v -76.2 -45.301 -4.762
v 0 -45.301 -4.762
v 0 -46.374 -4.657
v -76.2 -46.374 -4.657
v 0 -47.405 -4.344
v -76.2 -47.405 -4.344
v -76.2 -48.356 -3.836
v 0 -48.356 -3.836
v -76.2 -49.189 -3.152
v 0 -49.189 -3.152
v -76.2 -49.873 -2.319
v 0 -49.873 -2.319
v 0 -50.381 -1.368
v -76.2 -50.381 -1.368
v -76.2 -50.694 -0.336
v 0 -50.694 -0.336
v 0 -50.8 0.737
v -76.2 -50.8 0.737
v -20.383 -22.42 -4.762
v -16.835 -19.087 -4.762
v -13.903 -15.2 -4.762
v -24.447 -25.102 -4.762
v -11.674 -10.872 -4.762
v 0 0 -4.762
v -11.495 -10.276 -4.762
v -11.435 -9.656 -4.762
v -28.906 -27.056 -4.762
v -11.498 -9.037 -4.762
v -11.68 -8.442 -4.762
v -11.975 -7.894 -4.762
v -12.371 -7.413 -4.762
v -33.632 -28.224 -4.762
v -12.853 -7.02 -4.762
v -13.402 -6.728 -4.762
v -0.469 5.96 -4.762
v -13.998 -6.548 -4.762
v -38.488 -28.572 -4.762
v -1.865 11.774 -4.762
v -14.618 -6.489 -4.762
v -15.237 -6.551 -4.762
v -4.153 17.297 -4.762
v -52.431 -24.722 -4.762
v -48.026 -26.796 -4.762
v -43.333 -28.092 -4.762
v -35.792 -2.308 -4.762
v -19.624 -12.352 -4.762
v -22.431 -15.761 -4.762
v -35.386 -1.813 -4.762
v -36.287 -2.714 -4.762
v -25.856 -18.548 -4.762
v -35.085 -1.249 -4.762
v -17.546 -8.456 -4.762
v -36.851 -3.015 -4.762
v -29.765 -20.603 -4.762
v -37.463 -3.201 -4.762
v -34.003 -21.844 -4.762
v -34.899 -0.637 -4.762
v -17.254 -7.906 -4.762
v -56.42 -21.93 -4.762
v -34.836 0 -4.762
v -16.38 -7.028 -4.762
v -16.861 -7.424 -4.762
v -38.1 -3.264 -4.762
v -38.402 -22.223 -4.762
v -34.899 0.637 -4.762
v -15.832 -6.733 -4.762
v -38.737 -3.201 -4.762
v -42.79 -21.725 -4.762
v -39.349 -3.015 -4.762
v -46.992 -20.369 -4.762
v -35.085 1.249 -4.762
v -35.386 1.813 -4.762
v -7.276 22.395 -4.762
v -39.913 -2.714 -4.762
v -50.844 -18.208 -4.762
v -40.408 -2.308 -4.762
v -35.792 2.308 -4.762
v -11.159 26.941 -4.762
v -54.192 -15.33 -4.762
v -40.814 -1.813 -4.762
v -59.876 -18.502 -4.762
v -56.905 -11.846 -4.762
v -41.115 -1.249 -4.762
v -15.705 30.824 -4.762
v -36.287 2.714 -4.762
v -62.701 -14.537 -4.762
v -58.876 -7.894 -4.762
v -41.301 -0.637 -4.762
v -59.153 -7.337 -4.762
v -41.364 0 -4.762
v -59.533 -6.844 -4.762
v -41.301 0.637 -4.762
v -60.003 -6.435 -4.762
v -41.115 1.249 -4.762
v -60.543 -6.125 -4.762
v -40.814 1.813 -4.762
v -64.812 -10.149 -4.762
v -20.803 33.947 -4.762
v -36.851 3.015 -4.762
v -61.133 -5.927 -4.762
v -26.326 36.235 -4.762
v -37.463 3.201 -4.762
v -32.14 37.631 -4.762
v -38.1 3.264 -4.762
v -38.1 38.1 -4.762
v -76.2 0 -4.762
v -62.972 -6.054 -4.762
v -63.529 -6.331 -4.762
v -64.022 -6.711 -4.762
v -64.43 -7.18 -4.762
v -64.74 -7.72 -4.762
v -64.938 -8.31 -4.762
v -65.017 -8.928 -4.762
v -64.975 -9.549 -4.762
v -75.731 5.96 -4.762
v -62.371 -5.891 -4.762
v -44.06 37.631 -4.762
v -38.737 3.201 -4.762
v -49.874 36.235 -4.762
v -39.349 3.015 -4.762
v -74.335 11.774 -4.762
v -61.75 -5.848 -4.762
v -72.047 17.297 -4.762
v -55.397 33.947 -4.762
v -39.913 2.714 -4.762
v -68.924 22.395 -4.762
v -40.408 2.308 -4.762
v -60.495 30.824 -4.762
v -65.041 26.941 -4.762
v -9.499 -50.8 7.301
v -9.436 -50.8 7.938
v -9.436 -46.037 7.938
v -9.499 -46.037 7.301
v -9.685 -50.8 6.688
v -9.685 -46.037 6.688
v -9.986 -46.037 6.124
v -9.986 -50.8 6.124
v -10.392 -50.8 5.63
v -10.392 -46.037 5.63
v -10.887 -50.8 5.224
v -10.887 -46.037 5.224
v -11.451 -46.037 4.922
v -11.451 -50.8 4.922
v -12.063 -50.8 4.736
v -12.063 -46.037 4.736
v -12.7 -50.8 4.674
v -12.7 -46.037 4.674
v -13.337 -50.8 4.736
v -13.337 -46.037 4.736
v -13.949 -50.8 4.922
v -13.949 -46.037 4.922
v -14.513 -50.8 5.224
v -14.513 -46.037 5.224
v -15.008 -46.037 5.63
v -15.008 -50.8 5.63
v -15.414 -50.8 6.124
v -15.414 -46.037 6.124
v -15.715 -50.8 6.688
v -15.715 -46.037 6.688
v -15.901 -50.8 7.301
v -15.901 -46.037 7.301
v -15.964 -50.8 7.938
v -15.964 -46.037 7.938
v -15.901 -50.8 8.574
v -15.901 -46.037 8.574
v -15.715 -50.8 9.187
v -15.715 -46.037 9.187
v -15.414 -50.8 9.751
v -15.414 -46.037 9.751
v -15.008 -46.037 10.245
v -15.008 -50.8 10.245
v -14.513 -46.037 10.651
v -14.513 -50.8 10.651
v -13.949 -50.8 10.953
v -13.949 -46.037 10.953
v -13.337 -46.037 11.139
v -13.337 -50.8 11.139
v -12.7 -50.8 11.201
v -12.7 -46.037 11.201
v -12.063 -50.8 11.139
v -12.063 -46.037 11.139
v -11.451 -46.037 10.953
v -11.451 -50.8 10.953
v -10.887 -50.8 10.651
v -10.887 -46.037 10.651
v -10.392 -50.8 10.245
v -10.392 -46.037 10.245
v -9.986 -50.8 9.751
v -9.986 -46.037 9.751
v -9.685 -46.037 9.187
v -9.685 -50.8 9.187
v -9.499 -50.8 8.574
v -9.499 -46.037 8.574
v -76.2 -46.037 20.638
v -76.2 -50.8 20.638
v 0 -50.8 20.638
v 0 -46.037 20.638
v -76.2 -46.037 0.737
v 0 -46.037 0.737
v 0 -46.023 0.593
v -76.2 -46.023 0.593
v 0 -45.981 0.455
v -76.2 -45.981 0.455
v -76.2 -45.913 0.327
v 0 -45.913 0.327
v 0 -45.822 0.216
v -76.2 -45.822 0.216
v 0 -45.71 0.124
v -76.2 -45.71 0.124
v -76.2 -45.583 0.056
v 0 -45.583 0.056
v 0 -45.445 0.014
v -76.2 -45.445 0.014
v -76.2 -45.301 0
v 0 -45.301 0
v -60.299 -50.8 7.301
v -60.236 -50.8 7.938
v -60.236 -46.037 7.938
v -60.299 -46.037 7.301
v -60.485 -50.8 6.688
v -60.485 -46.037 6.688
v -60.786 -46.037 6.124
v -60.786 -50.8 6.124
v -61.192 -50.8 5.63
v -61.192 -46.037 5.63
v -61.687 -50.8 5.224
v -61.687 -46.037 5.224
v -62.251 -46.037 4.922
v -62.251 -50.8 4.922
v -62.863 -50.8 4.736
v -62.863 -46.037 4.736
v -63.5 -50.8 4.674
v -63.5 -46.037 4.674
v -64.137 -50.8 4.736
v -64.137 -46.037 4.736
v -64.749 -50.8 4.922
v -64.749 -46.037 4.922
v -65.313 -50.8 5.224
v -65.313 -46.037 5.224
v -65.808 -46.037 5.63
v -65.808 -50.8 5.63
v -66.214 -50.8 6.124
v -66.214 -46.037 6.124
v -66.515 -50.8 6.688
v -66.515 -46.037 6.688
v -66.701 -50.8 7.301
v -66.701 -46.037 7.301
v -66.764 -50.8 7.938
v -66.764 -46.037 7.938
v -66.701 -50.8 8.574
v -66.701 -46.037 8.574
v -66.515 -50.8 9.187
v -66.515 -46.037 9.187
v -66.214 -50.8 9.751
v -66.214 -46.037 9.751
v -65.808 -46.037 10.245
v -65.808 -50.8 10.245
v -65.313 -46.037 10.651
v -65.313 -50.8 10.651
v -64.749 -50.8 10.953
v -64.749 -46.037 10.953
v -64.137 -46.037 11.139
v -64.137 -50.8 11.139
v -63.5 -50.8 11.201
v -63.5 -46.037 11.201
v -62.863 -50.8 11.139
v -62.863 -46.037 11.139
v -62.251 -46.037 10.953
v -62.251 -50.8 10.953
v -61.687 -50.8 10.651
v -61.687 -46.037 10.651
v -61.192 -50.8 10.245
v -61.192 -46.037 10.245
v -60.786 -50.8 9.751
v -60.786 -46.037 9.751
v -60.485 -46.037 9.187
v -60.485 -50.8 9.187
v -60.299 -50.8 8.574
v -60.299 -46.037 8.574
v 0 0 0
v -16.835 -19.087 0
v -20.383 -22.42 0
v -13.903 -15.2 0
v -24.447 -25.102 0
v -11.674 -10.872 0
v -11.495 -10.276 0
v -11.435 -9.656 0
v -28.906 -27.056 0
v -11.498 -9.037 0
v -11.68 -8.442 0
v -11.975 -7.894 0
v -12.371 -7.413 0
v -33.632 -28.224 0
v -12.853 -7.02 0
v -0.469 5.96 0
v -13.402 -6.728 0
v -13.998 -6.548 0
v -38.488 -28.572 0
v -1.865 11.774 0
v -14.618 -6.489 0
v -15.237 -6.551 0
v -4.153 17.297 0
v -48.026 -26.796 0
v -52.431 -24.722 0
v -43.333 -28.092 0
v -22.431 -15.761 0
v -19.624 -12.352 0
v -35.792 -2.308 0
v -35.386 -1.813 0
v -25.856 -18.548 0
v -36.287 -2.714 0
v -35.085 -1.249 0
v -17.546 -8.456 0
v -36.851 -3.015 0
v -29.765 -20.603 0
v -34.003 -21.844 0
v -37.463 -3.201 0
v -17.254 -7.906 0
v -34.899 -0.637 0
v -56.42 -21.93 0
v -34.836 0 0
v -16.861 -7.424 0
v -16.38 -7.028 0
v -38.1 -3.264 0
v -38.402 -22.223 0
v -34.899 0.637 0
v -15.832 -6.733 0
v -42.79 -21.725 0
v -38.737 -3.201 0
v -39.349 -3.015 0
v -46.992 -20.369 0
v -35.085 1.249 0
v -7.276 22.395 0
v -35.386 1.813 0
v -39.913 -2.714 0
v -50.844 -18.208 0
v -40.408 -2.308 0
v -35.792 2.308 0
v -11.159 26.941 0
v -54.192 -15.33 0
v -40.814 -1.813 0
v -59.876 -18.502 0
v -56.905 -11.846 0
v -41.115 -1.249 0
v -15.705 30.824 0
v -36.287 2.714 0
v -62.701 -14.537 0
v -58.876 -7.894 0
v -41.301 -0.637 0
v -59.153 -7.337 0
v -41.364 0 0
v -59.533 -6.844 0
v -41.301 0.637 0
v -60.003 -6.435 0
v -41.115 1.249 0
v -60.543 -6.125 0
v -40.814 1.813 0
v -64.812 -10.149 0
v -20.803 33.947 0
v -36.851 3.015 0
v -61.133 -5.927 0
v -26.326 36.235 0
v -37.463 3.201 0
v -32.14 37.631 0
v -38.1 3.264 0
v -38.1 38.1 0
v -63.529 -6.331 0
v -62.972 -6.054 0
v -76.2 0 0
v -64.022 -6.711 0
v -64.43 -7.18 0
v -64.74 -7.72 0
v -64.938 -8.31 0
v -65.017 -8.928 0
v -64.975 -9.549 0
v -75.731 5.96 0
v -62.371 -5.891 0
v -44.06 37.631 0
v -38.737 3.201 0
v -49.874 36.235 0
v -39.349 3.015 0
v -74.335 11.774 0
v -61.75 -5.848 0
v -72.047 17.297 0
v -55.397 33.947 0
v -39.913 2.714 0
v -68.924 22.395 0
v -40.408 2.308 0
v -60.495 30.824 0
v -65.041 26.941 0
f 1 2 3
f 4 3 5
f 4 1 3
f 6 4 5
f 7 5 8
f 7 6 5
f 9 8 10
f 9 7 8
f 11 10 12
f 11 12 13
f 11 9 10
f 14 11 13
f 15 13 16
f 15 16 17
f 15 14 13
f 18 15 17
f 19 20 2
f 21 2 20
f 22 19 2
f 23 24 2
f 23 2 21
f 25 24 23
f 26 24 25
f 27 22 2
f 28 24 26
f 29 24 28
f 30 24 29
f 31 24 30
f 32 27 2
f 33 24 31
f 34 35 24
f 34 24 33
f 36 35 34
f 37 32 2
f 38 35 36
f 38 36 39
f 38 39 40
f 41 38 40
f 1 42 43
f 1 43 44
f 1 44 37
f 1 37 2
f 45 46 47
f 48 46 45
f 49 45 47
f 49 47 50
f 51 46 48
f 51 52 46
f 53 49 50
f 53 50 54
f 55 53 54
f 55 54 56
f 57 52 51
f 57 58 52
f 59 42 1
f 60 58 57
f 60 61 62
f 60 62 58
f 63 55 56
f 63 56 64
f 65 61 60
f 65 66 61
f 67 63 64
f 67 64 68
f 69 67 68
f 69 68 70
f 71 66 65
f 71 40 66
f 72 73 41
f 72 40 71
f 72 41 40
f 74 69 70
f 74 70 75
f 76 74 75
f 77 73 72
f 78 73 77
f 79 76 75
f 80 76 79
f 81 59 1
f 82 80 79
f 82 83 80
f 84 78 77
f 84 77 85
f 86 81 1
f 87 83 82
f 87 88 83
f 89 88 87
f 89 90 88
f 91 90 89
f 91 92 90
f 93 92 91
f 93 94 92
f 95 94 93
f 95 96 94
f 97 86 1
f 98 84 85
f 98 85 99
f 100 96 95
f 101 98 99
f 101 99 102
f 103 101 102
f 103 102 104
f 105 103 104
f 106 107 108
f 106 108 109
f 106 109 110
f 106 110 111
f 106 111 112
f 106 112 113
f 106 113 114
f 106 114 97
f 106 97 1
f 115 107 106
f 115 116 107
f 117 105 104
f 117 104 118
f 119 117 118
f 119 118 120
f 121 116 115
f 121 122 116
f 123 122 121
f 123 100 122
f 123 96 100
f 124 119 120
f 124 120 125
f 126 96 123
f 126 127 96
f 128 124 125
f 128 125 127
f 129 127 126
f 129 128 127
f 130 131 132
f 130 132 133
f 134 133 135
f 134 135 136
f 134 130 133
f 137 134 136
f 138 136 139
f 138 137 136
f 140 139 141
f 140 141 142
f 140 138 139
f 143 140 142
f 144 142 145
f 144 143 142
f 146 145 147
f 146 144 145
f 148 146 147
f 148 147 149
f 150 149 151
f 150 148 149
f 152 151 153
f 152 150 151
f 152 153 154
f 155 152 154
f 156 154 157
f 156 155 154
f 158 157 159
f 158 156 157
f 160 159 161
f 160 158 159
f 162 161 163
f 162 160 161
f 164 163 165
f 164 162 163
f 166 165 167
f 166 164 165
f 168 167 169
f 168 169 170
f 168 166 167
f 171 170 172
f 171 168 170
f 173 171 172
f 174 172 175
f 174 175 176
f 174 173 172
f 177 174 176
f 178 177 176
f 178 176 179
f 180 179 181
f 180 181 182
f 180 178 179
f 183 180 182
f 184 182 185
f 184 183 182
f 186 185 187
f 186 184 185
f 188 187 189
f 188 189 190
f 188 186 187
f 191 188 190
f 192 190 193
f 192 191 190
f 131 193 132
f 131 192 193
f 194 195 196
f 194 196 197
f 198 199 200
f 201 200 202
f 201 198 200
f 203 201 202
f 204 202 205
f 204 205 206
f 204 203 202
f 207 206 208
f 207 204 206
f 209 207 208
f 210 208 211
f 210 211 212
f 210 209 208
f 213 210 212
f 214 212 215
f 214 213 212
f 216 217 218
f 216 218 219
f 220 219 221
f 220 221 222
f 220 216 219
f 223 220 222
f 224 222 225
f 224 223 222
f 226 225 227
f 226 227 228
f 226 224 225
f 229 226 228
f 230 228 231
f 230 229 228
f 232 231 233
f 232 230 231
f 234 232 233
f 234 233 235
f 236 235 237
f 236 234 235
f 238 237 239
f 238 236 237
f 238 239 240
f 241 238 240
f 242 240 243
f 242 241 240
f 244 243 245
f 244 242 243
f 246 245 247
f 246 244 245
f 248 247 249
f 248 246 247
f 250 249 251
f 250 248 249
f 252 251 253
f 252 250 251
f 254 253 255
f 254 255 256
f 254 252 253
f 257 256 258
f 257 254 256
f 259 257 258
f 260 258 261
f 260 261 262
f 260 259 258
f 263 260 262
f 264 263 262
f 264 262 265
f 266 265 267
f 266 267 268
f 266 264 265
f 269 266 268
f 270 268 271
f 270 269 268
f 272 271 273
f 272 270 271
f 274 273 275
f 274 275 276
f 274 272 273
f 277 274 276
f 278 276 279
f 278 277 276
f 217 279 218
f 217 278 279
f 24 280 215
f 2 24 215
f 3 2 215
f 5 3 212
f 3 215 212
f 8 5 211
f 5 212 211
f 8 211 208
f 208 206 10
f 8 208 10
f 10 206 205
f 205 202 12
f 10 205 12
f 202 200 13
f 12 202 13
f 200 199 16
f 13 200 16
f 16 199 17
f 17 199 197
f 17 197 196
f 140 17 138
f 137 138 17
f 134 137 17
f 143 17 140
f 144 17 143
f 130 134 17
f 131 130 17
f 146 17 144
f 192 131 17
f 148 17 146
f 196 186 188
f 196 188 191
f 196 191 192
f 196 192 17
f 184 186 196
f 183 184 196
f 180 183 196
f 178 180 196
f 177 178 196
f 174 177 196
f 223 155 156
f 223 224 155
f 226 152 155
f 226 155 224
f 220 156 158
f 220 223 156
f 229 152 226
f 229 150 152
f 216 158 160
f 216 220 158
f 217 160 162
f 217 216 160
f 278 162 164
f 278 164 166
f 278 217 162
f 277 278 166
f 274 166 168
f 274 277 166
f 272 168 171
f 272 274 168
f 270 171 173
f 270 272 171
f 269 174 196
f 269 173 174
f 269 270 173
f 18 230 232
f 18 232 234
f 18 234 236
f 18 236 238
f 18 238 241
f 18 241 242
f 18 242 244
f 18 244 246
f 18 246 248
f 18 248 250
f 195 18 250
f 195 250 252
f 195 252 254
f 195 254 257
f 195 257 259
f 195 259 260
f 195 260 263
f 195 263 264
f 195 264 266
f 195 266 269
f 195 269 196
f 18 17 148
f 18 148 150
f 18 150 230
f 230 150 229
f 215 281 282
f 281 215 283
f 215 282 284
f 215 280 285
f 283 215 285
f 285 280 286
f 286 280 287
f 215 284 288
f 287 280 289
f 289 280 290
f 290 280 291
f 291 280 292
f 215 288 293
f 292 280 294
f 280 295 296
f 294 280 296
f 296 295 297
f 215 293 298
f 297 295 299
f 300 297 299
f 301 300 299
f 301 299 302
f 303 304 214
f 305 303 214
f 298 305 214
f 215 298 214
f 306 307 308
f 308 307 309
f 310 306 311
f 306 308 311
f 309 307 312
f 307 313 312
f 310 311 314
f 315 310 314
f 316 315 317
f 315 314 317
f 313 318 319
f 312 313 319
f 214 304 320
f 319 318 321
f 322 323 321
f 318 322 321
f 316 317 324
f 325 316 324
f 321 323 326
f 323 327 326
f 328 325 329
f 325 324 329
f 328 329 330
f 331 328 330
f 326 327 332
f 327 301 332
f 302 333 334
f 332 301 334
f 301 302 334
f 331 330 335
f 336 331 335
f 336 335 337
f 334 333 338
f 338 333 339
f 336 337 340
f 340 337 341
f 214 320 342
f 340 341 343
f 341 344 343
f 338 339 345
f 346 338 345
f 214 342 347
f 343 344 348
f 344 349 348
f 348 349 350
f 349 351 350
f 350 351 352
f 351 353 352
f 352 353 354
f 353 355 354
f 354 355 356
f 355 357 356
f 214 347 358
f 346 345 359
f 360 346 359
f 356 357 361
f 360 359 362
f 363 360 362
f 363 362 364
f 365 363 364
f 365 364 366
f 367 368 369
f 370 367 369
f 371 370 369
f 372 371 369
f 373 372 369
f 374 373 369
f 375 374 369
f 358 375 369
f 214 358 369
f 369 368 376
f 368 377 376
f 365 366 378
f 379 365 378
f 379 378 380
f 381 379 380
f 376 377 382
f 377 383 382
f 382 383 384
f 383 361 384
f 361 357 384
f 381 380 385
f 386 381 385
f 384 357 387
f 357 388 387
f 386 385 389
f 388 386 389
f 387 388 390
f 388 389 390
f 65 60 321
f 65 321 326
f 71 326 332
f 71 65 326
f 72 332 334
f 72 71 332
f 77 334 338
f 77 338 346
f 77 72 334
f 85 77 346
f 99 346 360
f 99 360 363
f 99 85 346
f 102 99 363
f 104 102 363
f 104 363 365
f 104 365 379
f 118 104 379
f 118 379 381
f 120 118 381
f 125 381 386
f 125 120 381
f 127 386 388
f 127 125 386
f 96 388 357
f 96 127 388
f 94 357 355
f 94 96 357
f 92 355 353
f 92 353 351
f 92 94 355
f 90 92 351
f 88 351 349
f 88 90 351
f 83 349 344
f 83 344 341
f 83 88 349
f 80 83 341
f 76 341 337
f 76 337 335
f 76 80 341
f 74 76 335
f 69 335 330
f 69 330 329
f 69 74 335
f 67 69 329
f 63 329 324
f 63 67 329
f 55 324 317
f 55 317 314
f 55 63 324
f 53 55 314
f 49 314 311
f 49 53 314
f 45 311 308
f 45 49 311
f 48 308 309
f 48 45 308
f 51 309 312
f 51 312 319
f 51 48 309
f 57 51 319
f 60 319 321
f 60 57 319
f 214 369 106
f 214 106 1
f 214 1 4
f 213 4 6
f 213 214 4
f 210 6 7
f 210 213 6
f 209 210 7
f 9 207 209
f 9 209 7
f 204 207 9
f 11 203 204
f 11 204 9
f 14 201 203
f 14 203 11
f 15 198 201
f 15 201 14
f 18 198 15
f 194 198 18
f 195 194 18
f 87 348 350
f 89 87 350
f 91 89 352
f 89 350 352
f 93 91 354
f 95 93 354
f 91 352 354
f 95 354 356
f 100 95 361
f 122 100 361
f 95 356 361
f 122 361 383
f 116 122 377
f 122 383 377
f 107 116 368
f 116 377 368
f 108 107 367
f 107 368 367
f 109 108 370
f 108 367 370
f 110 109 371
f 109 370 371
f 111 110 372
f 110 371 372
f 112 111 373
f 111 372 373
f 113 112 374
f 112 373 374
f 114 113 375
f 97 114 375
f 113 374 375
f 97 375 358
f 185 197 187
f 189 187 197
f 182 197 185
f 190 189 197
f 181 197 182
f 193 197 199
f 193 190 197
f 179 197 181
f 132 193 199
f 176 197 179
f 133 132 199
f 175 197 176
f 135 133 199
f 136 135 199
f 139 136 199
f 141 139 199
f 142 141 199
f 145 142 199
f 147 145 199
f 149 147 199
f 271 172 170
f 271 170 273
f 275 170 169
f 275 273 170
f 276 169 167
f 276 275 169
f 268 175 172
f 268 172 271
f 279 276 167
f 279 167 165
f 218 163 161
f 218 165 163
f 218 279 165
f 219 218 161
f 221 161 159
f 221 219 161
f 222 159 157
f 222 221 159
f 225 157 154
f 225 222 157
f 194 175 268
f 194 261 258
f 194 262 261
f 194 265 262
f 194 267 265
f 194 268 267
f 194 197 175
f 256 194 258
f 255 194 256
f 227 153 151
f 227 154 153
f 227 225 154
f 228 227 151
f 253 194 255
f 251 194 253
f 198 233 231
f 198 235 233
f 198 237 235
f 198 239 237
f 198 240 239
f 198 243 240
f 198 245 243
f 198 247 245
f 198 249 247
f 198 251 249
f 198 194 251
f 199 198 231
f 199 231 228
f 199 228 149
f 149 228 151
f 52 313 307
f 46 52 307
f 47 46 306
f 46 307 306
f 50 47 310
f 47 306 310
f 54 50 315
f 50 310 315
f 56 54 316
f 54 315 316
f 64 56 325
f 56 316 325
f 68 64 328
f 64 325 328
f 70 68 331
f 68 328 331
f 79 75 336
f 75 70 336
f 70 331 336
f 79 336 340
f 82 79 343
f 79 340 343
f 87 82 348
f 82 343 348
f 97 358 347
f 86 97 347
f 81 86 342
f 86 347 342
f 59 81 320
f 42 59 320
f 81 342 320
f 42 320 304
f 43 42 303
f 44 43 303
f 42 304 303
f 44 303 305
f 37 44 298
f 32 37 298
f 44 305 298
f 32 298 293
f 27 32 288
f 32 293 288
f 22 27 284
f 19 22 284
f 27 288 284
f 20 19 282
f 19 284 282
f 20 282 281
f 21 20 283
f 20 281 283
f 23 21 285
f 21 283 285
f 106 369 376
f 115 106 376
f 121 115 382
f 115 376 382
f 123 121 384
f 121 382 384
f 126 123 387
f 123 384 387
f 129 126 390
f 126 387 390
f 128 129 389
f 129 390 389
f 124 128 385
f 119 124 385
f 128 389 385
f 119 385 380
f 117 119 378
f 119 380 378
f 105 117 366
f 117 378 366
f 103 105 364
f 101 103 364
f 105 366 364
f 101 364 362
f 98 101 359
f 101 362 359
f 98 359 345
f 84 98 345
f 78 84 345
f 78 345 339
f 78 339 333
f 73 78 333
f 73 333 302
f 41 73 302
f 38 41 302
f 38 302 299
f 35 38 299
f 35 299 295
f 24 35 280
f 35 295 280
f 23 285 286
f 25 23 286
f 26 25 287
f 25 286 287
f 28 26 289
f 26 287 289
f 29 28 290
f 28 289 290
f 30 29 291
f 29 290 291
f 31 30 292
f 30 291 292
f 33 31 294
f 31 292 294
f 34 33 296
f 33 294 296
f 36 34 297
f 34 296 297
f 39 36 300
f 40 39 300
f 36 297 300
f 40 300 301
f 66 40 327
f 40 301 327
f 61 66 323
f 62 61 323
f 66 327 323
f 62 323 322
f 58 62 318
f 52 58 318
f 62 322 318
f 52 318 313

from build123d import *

# Parameters (mm, degrees)
BASE_FLANGE1_DEPTH                = 4.7625
EDGE_FLANGE2_STRIP_W              = 20.5232
EDGE_FLANGE2_STRIP_H              = 4.7625
EDGE_FLANGE2_STRIP_CUT_DEPTH      = 76.2
EDGE_FLANGE2_DEPTH                = 76.2
F_1_4_START                       = -50.8
F_1_4_CLEARANCE_HOLE3_OUTLINE_R   = 3.2639
F_1_4_CLEARANCE_HOLE3_DEPTH       = 4.7625
F_1_4_START_2                     = -4.7625
F_1_4_CLEARANCE_HOLE3_2_OUTLINE_R = 3.2639
F_1_4_CLEARANCE_HOLE3_2_DEPTH     = 4.7625
CUT_EXTRUDE1_DEPTH                = 94.877507457


# Read off the part's stored shape, not the designer's step: 1/4 Clearance Hole3
# Sheet-metal steps are written as plain solids
with BuildPart() as part:
    # Sketch1 → Base-Flange1 (new body)
    with BuildSketch(Plane.XY):
        with BuildLine():
            Line((0, 0), (0, -50.8))
            Line((0, -50.8), (-76.2, -50.8))
            Line((-76.2, -50.8), (-76.2, 0))
            ThreePointArc((-76.2, 0), (-38.1, 38.1), (0, 0))
        make_face()
    extrude(amount=-BASE_FLANGE1_DEPTH)

    # Edge-Flange2 strip (across the edge) → Edge-Flange2 strip cut (cut)
    with BuildSketch(Plane(origin=(-76.2, -50.8, 0), x_dir=(0, 1, 0), z_dir=(1, 0, 0))):
        with Locations((-4.7625, -2.38125)):
            Rectangle(EDGE_FLANGE2_STRIP_W, EDGE_FLANGE2_STRIP_H)
    extrude(amount=EDGE_FLANGE2_STRIP_CUT_DEPTH, mode=Mode.SUBTRACT)

    # Edge-Flange2 section (across the edge) → Edge-Flange2 (add)
    with BuildSketch(Plane(origin=(-76.2, -50.8, 0), x_dir=(0, 1, 0), z_dir=(1, 0, 0))):
        with BuildLine():
            Line((0, 0.7366), (0, 20.6375))
            Line((0, 20.6375), (4.7625, 20.6375))
            Line((4.7625, 20.6375), (4.7625, 0.7366))
            ThreePointArc((4.7625, 0.7366), (4.978245145, 0.215745145), (5.4991, 0))
            Line((5.4991, 0), (5.4991, -4.7625))
            ThreePointArc((5.4991, -4.7625), (1.6106491, -3.1518509), (0, 0.7366))
        make_face()
    extrude(amount=EDGE_FLANGE2_DEPTH)

    # 1/4 Clearance Hole3 outline → 1/4 Clearance Hole3 (cut)
    with BuildSketch(Plane(origin=(0, 0, 0), x_dir=(1, 0, 0), z_dir=(0, 1, 0)).offset(F_1_4_START)):
        with Locations((-12.7, -7.9375)):
            Circle(F_1_4_CLEARANCE_HOLE3_OUTLINE_R)
        with Locations((-63.5, -7.9375)):
            Circle(F_1_4_CLEARANCE_HOLE3_OUTLINE_R)
    extrude(amount=F_1_4_CLEARANCE_HOLE3_DEPTH, mode=Mode.SUBTRACT)

    # 1_4 Clearance Hole3 2 outline → 1_4 Clearance Hole3 2 (cut)
    with BuildSketch(Plane.XY.offset(F_1_4_START_2)):
        with Locations((-38.1, 0)):
            Circle(F_1_4_CLEARANCE_HOLE3_2_OUTLINE_R)
    extrude(amount=F_1_4_CLEARANCE_HOLE3_2_DEPTH, mode=Mode.SUBTRACT)

    # Sketch25 → Cut-Extrude1 (cut, through all)
    with BuildSketch(Plane.XY):
        with BuildLine():
            ThreePointArc((-64.811855715, -10.149255602), (-38.48848332, -28.57235912), (-11.673955742, -10.871743644))
            ThreePointArc((-11.673955742, -10.871743644), (-13.402211365, -6.727544988), (-17.546410021, -8.455800612))
            ThreePointArc((-17.546410021, -8.455800612), (-38.402153693, -22.222945983), (-58.875887778, -7.893865468))
            ThreePointArc((-58.875887778, -7.893865468), (-62.971566813, -6.053576567), (-64.811855715, -10.149255602))
        make_face()
    extrude(amount=-CUT_EXTRUDE1_DEPTH, mode=Mode.SUBTRACT)


solid = part.part
